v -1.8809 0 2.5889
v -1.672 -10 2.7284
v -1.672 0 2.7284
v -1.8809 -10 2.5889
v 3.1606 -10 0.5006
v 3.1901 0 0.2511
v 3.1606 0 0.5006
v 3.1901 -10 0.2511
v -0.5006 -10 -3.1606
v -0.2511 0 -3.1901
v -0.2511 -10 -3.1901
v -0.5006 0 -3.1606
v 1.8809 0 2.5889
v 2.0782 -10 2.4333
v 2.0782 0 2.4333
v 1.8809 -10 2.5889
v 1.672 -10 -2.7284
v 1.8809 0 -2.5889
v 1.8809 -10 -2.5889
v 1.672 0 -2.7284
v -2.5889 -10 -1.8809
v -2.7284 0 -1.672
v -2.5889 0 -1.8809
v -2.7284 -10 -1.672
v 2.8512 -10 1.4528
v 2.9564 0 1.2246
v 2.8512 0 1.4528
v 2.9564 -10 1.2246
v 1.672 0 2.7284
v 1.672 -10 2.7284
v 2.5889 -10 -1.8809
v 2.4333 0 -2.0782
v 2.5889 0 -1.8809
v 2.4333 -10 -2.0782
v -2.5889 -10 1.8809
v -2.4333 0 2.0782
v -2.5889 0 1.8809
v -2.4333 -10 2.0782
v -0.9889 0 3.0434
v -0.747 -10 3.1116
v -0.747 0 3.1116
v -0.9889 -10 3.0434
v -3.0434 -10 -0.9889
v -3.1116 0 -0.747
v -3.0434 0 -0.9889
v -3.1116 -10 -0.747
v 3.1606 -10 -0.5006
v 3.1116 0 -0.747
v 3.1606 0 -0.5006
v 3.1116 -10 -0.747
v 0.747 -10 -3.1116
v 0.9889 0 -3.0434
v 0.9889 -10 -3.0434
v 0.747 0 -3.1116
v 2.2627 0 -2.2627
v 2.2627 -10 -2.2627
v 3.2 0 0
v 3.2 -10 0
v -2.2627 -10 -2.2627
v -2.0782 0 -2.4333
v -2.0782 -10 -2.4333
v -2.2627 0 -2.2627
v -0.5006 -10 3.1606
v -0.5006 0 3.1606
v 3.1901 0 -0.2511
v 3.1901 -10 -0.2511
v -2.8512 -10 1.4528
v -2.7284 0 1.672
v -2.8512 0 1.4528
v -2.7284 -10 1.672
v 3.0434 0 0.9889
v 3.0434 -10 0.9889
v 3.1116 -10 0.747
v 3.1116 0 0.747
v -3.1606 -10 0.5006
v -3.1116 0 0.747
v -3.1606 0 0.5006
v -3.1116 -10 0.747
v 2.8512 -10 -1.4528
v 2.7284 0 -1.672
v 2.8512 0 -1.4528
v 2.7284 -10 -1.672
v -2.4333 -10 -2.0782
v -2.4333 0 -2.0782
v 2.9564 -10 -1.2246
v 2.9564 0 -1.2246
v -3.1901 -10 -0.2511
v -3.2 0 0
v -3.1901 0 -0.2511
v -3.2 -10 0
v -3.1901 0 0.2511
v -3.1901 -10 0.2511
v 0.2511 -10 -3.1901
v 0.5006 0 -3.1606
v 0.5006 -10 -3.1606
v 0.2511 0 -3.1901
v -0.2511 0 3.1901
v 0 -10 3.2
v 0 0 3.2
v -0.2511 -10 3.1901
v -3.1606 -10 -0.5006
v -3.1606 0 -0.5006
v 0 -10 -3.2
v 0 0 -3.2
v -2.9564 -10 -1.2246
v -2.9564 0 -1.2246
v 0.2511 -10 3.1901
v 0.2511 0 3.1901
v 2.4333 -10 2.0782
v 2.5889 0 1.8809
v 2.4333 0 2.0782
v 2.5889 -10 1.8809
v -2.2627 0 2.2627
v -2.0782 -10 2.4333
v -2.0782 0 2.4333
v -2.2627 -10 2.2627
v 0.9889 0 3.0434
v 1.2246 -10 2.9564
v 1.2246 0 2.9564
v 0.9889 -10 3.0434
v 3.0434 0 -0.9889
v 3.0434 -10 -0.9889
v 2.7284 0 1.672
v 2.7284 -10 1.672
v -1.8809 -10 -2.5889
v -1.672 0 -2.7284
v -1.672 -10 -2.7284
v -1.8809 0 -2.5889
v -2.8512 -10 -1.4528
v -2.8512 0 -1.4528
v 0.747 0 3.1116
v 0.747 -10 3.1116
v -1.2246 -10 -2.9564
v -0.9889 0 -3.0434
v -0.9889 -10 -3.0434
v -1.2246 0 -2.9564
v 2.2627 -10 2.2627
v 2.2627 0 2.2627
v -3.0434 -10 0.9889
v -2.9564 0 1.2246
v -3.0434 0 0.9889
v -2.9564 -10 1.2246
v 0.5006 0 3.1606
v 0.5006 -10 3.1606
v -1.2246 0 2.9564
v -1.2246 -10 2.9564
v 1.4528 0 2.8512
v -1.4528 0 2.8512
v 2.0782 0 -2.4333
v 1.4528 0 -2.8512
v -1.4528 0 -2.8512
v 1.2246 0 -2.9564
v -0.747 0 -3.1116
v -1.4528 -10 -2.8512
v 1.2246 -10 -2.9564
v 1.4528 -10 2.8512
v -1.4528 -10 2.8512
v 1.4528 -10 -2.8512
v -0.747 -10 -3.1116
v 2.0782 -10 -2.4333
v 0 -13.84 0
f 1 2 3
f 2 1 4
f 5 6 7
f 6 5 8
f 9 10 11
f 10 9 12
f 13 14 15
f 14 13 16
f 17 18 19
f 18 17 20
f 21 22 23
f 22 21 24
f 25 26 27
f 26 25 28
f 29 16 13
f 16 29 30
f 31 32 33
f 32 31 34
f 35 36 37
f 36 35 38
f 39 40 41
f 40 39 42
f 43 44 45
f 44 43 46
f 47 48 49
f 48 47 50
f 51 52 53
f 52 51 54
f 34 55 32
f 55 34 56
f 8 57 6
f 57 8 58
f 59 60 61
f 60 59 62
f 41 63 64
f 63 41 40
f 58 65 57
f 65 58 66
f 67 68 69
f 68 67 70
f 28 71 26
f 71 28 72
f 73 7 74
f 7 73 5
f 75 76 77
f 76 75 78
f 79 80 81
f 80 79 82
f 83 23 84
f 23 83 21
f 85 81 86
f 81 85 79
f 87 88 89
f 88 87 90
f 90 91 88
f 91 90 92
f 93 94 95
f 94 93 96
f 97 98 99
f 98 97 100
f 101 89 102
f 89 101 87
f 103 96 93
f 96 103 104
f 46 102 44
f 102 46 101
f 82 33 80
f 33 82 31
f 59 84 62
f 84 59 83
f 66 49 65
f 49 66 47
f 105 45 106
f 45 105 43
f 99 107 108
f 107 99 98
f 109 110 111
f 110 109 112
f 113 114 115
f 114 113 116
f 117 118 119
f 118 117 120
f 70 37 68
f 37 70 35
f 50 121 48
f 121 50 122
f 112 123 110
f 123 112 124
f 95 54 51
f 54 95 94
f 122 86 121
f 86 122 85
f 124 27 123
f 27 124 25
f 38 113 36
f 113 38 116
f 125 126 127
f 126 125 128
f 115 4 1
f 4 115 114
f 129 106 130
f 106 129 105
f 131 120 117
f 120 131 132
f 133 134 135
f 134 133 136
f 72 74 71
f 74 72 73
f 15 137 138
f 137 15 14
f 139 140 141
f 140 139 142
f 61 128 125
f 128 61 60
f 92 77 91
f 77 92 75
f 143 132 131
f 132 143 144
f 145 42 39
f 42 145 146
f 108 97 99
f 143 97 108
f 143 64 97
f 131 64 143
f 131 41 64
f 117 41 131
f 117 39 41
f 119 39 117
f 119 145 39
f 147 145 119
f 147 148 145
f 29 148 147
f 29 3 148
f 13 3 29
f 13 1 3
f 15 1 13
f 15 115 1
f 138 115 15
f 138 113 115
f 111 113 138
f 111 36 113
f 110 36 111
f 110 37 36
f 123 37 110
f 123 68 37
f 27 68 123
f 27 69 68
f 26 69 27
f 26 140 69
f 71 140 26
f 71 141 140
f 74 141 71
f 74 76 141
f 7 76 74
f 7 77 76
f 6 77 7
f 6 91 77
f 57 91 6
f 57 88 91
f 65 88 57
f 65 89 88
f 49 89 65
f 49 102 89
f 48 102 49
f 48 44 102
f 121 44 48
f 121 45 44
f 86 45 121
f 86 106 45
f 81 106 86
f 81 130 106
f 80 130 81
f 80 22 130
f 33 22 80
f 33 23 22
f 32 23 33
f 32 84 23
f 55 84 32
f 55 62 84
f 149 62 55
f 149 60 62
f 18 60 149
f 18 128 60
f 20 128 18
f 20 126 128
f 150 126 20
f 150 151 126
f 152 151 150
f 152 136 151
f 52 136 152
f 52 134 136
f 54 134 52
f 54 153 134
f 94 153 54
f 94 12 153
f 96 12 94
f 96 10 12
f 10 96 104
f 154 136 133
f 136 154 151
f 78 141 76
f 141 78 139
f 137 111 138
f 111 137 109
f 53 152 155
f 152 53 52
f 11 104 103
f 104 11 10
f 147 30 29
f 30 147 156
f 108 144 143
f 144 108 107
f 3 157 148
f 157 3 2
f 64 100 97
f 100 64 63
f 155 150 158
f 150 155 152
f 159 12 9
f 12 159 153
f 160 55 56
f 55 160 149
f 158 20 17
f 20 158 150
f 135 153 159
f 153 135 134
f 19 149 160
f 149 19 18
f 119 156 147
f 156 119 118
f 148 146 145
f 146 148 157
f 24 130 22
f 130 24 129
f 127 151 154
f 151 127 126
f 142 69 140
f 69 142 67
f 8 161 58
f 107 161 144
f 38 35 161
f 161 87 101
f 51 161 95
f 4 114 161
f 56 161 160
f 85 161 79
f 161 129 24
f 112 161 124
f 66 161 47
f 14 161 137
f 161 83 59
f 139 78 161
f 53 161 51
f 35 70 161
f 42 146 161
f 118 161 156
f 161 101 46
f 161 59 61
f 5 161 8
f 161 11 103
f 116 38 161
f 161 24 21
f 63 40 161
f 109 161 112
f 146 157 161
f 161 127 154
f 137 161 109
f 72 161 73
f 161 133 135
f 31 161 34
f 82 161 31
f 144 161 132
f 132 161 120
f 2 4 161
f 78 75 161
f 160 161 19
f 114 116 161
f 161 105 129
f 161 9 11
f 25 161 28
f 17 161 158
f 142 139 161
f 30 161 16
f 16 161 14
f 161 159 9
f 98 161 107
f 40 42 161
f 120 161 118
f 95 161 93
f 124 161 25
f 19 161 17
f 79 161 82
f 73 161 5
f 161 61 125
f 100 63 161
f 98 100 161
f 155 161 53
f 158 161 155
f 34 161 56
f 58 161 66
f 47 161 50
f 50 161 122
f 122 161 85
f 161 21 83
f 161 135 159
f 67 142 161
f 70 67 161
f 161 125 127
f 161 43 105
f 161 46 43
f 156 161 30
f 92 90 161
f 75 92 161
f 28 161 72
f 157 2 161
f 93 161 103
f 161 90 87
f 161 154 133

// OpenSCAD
// file: ../params.scad
thickness=2;

// params for the central cylinder
inner_tube_length=50;
inner_tube_radius=20;

cylinder_radius_margin=0.5;

rear_axis_radius=3;
rear_axis_length=10;
rear_axis_padding=1;
front_axis_padding=1;

// motor
motor_total_length=71.35;
motor_block_length=47.3;
motor_block_side=42.3;
motor_block_flat_diameter=53.6;
motor_block_and_disk_length=49;
motor_disk_diameter=22;
motor_disk_length=motor_block_and_disk_length - motor_block_length;
motor_axis_length=motor_total_length - motor_block_and_disk_length;
motor_axis_diameter=5;
motor_axis_diameter_flat=4.5;
motor_axis_radius=motor_axis_diameter / 2;
motor_axis_radius_flat=motor_axis_diameter_flat - motor_axis_radius;

// motor holder
motor_support_width=50;
motor_support_height=51;
motor_support_length=54;
motor_support_hole_length=33.5;
motor_support_hole_width=4;
motor_support_motor_hole_dist_top=9.5;
motor_support_motor_hole_center_height=motor_support_height-motor_support_motor_hole_dist_top-motor_disk_diameter/2;


// params for holes in the central cylinder
hole_length=inner_tube_length-1;
hole_depth=inner_tube_radius-5;
hole_width=inner_tube_radius*0.7;



cylinder_radius_margin=0.5;

reservoirH=30;
// main file
include <../params.scad>

// for local tests only
rear_axis(0.2, true);

module front_door() {
    
    // padder
    translate([0,-inner_tube_length/2+front_axis_padding,0])
    rotate([90,0,0])
    front_door_padder(front_axis_padding);
}

module front_door_padder(height) {
    radius_bottom=motor_axis_radius*2.5;
    radius_top=motor_axis_radius*1.5;
    
    // cone
    rotate_extrude(angle=360)
    polygon(points = [
        [0, 0],
        [radius_bottom, 0],
        [radius_top, height],
        [0, height]
    ]);
}


module rear_axis(radiusPadding=0, addTopCone=false) {    
    rotate([90,0,0])
    cylinder(rear_axis_length,r=rear_axis_radius+radiusPadding,center=false,$fn=80);

    if (addTopCone) {
        coneR = rear_axis_radius + radiusPadding;
        
        translate([0,-rear_axis_length,0])
        rotate([90,0,0])
        cylinder(h=coneR*1.2,r1=coneR,r2=0,center=false,$fn=80);
    }
}
